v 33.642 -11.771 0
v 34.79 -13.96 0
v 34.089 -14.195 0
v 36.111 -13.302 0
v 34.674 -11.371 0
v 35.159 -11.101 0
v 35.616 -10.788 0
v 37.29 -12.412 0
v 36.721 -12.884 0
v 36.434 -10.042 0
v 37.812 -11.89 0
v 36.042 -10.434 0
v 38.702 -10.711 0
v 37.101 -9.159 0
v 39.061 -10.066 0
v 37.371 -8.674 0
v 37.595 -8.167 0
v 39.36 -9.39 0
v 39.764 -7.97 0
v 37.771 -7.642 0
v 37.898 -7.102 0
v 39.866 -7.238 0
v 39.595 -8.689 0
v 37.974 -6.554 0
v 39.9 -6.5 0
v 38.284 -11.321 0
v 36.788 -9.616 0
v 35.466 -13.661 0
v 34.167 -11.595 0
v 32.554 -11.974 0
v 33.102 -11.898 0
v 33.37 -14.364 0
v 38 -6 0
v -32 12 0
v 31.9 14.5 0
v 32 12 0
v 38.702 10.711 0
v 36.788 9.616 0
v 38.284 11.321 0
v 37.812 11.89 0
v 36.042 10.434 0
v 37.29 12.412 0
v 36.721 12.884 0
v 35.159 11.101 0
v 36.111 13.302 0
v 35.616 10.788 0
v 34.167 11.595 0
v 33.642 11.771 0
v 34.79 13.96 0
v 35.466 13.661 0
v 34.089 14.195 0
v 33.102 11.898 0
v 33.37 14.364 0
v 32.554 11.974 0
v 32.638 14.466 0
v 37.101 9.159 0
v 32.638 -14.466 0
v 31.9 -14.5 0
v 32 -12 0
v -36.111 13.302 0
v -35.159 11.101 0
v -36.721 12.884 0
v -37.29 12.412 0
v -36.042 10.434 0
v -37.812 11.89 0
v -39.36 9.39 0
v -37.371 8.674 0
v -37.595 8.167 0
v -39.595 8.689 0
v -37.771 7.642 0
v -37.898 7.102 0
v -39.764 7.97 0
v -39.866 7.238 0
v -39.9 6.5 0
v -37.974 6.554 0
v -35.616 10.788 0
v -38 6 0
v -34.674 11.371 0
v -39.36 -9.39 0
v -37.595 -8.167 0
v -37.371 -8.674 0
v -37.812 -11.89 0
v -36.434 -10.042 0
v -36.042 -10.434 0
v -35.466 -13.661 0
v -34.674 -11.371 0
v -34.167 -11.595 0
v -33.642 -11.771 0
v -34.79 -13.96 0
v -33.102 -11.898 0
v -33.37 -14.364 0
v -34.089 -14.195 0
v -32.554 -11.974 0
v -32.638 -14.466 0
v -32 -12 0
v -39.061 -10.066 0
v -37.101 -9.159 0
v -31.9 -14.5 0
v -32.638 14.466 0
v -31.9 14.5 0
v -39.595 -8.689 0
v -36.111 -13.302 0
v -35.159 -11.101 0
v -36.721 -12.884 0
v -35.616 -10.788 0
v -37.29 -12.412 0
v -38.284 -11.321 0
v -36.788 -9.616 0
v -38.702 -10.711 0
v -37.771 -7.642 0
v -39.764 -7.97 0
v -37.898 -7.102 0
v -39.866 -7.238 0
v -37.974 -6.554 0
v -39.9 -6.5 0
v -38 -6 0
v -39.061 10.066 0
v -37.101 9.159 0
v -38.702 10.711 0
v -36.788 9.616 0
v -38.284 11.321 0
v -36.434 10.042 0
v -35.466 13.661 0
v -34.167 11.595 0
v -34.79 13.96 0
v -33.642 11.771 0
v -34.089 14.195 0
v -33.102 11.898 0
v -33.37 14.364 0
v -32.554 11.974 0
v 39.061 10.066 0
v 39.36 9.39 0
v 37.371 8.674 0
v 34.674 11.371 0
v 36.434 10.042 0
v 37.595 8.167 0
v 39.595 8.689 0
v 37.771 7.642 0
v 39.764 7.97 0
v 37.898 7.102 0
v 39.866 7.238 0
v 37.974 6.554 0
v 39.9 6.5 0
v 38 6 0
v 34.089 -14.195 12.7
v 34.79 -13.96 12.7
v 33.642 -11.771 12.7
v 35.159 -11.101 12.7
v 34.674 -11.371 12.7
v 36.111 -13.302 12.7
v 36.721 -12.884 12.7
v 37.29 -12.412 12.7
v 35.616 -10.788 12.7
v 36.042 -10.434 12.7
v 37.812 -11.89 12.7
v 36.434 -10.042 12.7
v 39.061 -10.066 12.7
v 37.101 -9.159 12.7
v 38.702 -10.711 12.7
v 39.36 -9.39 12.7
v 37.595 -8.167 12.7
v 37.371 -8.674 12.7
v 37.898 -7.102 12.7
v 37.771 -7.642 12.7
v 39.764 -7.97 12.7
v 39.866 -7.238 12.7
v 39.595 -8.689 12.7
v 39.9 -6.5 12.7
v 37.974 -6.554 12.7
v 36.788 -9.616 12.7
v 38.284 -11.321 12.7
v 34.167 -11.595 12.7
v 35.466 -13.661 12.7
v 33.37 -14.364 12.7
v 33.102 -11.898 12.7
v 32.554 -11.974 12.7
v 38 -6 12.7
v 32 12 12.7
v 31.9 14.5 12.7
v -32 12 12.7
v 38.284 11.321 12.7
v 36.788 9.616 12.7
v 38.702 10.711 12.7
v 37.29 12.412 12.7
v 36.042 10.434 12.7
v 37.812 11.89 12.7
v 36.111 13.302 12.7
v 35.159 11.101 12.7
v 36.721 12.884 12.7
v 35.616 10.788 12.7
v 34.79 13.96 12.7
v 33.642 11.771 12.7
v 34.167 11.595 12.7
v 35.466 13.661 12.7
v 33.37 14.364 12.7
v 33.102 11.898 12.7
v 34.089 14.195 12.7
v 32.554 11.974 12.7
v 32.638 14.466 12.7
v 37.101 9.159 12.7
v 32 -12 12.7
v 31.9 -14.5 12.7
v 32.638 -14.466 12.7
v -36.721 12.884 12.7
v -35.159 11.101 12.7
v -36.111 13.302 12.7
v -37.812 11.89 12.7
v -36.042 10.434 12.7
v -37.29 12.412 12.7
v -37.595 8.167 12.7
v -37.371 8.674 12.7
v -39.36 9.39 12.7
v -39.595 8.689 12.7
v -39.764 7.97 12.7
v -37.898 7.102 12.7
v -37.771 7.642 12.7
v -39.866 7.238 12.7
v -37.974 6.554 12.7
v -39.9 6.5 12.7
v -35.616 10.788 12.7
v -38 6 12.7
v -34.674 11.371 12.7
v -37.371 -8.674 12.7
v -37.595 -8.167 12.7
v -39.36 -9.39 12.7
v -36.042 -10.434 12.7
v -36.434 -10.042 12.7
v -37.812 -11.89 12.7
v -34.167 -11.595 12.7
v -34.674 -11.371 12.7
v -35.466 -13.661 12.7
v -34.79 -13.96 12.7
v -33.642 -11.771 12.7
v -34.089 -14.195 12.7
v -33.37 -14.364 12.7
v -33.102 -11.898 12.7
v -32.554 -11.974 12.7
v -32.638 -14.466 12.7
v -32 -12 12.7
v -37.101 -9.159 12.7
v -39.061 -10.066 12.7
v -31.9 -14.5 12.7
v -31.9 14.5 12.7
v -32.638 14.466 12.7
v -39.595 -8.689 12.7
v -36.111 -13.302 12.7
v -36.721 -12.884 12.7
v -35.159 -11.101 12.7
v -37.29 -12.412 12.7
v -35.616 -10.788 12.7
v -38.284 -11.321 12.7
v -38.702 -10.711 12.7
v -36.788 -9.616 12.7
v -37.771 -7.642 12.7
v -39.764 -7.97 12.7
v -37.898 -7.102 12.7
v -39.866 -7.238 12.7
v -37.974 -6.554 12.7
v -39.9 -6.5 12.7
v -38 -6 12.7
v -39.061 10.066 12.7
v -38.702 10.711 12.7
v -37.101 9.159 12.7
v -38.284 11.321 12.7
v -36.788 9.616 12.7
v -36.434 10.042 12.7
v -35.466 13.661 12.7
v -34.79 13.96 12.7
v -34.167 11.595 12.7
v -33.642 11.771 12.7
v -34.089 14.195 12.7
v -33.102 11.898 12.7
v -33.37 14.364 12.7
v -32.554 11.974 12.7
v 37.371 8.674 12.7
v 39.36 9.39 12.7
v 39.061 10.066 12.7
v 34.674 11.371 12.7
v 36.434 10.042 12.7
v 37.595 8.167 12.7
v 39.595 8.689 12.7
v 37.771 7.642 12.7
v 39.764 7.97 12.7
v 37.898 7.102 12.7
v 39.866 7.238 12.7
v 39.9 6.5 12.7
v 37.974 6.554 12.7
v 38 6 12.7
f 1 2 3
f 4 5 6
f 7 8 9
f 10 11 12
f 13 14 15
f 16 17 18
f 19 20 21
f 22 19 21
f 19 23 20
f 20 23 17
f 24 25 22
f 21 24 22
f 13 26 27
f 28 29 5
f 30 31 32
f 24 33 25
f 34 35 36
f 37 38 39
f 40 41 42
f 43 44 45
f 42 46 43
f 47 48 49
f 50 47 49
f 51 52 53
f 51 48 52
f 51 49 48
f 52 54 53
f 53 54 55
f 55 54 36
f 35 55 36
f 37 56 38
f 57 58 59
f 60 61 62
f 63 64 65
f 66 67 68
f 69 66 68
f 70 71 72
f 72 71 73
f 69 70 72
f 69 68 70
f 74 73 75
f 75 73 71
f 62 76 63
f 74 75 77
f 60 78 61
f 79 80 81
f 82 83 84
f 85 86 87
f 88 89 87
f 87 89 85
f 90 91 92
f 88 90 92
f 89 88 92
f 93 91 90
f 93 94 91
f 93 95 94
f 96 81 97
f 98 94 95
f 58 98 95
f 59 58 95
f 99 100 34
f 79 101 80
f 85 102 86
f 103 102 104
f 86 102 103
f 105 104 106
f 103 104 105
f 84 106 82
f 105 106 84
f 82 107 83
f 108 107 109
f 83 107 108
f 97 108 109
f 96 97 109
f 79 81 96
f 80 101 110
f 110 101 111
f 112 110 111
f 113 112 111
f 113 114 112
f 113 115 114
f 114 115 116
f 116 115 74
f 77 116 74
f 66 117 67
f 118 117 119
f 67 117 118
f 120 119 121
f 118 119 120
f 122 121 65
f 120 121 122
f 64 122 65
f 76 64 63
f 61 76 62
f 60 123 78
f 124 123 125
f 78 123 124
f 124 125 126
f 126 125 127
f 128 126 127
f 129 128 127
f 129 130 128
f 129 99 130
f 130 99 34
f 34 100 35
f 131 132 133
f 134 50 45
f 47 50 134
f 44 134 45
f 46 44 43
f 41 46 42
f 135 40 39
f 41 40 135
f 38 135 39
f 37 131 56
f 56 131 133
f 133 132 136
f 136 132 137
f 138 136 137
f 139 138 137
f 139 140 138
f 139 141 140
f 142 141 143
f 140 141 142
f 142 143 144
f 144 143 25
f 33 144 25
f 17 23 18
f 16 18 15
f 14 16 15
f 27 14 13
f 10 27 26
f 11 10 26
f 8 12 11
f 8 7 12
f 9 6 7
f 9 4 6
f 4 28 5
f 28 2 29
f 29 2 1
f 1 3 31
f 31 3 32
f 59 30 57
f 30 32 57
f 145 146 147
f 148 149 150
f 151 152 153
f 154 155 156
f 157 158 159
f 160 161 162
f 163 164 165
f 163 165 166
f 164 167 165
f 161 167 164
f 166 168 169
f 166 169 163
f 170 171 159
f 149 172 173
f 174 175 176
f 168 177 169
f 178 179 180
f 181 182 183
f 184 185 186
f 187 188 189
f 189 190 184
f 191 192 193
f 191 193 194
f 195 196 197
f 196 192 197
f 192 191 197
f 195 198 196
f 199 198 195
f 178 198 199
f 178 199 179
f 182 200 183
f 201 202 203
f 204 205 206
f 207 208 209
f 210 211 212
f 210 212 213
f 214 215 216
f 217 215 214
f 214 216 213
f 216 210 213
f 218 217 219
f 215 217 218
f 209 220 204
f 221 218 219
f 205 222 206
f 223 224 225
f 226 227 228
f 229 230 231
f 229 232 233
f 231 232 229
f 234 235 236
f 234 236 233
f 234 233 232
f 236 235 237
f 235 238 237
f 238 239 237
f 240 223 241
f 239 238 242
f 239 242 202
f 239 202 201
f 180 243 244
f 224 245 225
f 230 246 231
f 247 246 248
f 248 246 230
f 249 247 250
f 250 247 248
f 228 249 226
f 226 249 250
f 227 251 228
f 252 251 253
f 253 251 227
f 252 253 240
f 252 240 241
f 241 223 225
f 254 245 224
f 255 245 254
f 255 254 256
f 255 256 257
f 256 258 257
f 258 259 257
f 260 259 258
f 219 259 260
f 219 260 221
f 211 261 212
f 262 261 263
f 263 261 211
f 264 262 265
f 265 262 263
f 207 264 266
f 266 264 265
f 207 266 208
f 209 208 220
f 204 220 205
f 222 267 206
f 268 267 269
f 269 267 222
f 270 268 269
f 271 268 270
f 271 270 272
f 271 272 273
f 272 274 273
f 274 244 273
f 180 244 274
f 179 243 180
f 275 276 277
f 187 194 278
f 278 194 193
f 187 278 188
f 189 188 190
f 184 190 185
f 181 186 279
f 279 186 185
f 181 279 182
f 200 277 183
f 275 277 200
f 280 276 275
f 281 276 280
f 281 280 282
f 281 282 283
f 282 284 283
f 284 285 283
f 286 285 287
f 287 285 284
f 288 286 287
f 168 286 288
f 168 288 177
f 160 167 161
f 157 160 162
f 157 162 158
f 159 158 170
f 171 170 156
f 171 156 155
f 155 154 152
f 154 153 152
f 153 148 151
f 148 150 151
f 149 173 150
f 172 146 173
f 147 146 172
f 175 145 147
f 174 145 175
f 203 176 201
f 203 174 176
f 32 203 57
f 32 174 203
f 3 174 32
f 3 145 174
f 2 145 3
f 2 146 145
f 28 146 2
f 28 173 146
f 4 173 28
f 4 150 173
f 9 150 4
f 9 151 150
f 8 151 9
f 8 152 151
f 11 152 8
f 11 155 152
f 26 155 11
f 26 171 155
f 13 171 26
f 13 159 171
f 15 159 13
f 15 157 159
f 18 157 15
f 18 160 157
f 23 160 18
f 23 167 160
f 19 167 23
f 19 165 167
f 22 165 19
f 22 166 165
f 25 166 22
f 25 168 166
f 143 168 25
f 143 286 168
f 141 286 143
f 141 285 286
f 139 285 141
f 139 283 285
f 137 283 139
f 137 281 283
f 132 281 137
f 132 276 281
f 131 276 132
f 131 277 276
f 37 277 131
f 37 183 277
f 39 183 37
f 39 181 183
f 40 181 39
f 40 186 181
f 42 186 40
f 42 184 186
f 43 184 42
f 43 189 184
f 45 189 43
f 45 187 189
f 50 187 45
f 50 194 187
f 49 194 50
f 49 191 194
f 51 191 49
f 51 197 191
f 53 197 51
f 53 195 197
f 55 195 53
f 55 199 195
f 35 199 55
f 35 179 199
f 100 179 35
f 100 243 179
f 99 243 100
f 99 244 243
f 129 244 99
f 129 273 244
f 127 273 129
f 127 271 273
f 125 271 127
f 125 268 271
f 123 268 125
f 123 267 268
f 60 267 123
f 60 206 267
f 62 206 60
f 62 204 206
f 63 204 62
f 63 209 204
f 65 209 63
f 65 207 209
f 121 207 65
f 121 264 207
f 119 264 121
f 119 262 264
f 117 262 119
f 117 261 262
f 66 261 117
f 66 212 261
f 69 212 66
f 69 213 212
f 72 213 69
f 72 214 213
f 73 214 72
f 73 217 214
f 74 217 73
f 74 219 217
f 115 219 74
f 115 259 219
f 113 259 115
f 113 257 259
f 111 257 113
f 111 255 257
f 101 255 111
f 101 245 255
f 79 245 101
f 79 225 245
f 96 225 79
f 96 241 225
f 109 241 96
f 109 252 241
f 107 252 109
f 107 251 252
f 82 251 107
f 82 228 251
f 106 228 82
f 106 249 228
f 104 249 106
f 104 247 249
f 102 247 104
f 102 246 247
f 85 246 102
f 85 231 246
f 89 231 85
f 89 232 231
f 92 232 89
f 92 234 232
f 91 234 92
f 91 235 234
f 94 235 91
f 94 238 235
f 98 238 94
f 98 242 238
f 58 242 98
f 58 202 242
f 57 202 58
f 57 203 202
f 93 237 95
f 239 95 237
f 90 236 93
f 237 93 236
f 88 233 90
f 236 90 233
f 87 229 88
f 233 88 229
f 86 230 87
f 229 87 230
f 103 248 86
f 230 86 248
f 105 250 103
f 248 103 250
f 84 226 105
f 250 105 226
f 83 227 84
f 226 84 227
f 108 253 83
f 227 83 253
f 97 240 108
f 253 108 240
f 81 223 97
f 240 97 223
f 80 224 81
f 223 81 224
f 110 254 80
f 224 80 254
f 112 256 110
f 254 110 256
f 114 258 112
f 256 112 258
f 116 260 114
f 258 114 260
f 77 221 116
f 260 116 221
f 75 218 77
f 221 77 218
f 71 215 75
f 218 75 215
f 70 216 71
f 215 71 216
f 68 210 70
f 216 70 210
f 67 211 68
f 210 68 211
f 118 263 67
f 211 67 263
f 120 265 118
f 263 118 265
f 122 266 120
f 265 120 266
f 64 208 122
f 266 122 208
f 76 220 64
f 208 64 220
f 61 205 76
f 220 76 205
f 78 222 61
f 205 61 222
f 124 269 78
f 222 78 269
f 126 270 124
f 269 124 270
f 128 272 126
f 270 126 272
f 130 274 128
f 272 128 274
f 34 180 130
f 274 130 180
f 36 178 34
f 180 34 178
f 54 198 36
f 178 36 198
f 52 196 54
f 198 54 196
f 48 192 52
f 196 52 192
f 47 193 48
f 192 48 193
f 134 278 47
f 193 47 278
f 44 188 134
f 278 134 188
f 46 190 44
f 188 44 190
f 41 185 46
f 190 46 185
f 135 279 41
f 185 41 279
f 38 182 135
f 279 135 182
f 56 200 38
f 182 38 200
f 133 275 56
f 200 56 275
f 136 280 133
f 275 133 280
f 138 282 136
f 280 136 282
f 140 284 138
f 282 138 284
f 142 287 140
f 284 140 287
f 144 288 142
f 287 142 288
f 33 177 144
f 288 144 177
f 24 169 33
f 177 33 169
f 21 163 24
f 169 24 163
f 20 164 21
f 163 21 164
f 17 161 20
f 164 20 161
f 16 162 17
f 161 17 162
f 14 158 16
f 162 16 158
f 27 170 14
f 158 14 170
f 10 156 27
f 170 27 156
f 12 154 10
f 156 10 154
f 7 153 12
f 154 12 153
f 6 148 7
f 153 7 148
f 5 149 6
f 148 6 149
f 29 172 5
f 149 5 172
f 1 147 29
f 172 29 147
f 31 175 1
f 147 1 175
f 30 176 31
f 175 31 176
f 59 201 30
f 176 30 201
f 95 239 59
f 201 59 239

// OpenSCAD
// file: ../lib/TOGArrayLib1.scad
// TOGArrayLib1.5
// 
// Functions for working with arrays.
// 
// v1.1:
// - tal1_reduce assert(is_list(items)) to prevent infinite recursion
//   when given undefined or other non-list values
// v1.1.1:
// - Fix tal1_uniq_remap_v2 to return "list-remap-result" as the
//   first element of the returned list
// v1.2:
// - Add tal1_replace_at function
// v1.3:
// - tal1_is_vec_of, tal1_is_vec_of_num
// v1.4:
// - tal1_assert_for_each, for when you want to assert something
//   about each of a list of items and get nice failure messages
// v1.5:
// - Add tal1_duplicate_reversed function, which may be
//   handy when generating symmetrical polygons and stuff.

/**
 * Make a list with the contents of list `a`,
 * but starting at offset `off`, replaced by the contents of list `b`.
 * len(result) = max(len(a), off+len(b))
 */
function tal1_replace_at(a, off, b, default_value=undef, default_value_function=undef) =
	assert(is_list(a))
	assert(is_list(b))
	let( _dvf = !is_undef(default_value_function) ? default_value_function : function(i) default_value )
[
	for( i=[0:1:min(off,len(a))-1] ) a[i],
	for( i=[len(a):1:off-1] ) _dvf(i),
	for( i=[off:1:off+len(b)-1] ) b[i-off],
	for( i=[off+len(b):1:len(a)-1] ) a[i],
];

// Simplest case
assert([] == tal1_replace_at([], 0, []));
// Second simplest cases
assert(["foo"] == tal1_replace_at(["foo"], 0, []));
assert(["foo"] == tal1_replace_at([], 0, ["foo"]));
// Replace one item
assert(["foo","quux","baz"] == tal1_replace_at(["foo","bar","baz"], 1, ["quux"]));
// Replace and extend
assert(["foo","quux","tuna","tina"] == tal1_replace_at(["foo","bar","baz"], 1, ["quux", "tuna", "tina"]));
// Add beyond end of `a`
assert(["foo","zzz","quux"] == tal1_replace_at(["foo"], 2, ["quux"], default_value="zzz"));
// Adding 'nothing' should still fill to that point with defaults
assert(["foo","zzz","zzz"] == tal1_replace_at(["foo"], 3, [], default_value="zzz"));


function tal1_reduce(start, items, func, offset=0) =
	assert(is_list(items))
	len(items) == offset ? start :
	tal1_reduce(func(start, items[offset]), items, func, offset+1);

function tal1_consecutive_duplicate_count(items) = tal1_reduce(
	[0, undef],
	items,
	function(z,item) [z[0] + (item == z[1] ? 1 : 0), item]
)[0];

assert(0 == tal1_consecutive_duplicate_count([]));
assert(0 == tal1_consecutive_duplicate_count([50]));
assert(1 == tal1_consecutive_duplicate_count([50,50]));
assert(0 == tal1_consecutive_duplicate_count([50,51,52,53]));
assert(1 == tal1_consecutive_duplicate_count([50,51,52,52]));
assert(3 == tal1_consecutive_duplicate_count([50,50,50,50]));

// Set test_size to arbirarily large values
// to ensure that OpenSCAD can handle heavy recursion
let(test_size=1000) assert(test_size/2 == tal1_consecutive_duplicate_count([for(i=[0:1:test_size-1]) floor(i/2)]));



function tal1_uniq_(items, off0, off1) =
	let(chunklen = off1-off0)
	chunklen == 0 ? [] :
	chunklen == 1 ? [items[off0]] :
	let(half=floor(chunklen/2))
	let(left  = tal1_uniq_(items, off0     , off0+half))
	let(right = tal1_uniq_(items, off0+half, off1     ))
	assert(len(left) > 0)
	assert(len(right) > 0)
	left[len(left)-1] == right[0] ? [each left, for(i=[1:1:len(right)-1]) right[i]] :
	[each left, each right];

/** Given a list of items, returns a new list with identical consecutive items merged */
function tal1_uniq(items) = tal1_uniq_(items, 0, len(items));

assert([] == tal1_uniq([]));
assert([123] == tal1_uniq([123]));
assert([55,0,1,2,3] == tal1_uniq([55,0,1,2,3]));
assert([55,0,1,2] == tal1_uniq([55,0,1,1,2]));
assert([55,0,1] == tal1_uniq([55,55,0,0,0,0,0,0,1,1,1,1]));
assert([55,0] == tal1_uniq([55,0,0,0,0,0,0,0]));



/**
 * Returns [new items, old index -> new index mapping].
 * No-op version.
 */
function tal1_uniq_remap_v1(items) =
	["list-remap-result", items, [for (vi=[0:1:len(items)-1]) vi]];

// [a, a, b, b, c, c]
//
// [a,    ...], []  -> [a],[0]
// [a, a, ...], [0] -> [a],[0,0]

assert([1,2,3] == [1,2,3]);

/**
 * Recursive version that will combine adjacent identical vertexes,
 * but will use the original items.
 */
function tal1_uniq_remap_v2(items, map=[]) =
	let(index = len(map))
	len(items) == index ? ["list-remap-result", items, map] :
	index == 0 ? tal1_uniq_remap_v2(items, [0]) :
	items[index] == items[map[index-1]] ? tal1_uniq_remap_v2(items, [for(vi=map) vi, map[index-1]]) :
	tal1_uniq_remap_v2(items, [for(vi=map) vi, index]);

assert(tal1_uniq_remap_v2([1,1,2,2,3,4]) == ["list-remap-result", [1,1,2,2,3,4], [0,0,2,2,4,5]]);


/**
 * Returns true if `vec` is a list of at least min_len items
 * and component_check(each item, even those beyond min_len) is true.
 */
function tal1_is_vec_of(vec, min_len=0, component_check=function(x) true) =
	assert(is_num(min_len) && min_len >= 0)
	assert(is_function(component_check))
	is_list(vec) && len(vec) >= min_len &&
	tal1_reduce(true, vec, function(prev,item) prev && component_check(item));

function tal1_is_vec_of_num(vec, min_len=0) = tal1_is_vec_of(vec, min_len, function(i) is_num(i));

assert( true == tal1_is_vec_of_num([1,2,3]));
assert( true == tal1_is_vec_of_num([]));
assert( true == tal1_is_vec_of_num([1,2,3], 3));
assert(false == tal1_is_vec_of_num([1,2], 3));
assert(false == tal1_is_vec_of_num([1,2,"spoon"], 3));
// Requirements are ambiguous when
// first min_len items are numbers, but there are non-numeric items afterwards,
// so let's error on the side of saying 'no, it's not a list of numbers';
// i.e. the item check and the min_len are independent.
assert(false == tal1_is_vec_of_num([1,2,3,"artichoke"], 3));


/**
 * Asserts that item_checker(each item in list, index of item)[0] is true.
 * Second element of item_checker return value is assertion message.
 * Returns the original list, in case that's useful to you.
 */
function tal1_assert_for_each(list, item_checker) =
	let( _ignored = [ for(i=[0:1:len(list)-1])
		let(q=item_checker(list[i],i))
		let(passed=is_bool(q) ? q : is_list(q) ? q[0] : assert(false, str(
			"tal1_assert_for_each: item_checker should return Bool|[Bool,String], but returned ",
			q, " for item at index ", i)))
		let(message=is_list(q) ? q[1] : undef)
		assert(passed, message)
		q
	])
	list;

// Callback can return a boolean...
assert([1,2,3] == tal1_assert_for_each([1,2,3], function(v,i) is_num(v)));
// ...or a [boolean, string]
assert([1,2,3] == tal1_assert_for_each([1,2,3], function(v,i) [is_num(v), "element be a num"]));

// [a, b, c] -> [a, b, c, rxf(c), rxf(b), rxf(a)]
function tal1_duplicate_reversed(list, rxf=function(item) item) =
	[
		each list,
		for( i=[len(list)-1 : -1 : 0] ) rxf(list[i]),
	];
// file: ../lib/TOGComplexLib1.scad
function tcplx1_multiply(a, b) =
	[a[0]*b[0] - a[1]*b[1], a[0]*b[1] + a[1]*b[0]];
function tcplx1_divide(a, b) =
	let(bot = (b[0]*b[0] + b[1]*b[1]))
	[
		(a[0]*b[0] + a[1]*b[1])/bot,
		(a[1]*b[0] - a[0]*b[1])/bot
	];

assert([-11,23] == tcplx1_multiply([3,2], [1,7]));

assert([-1,3] == tcplx1_multiply([3,1], [0,1]));
assert([-1,3] == tcplx1_multiply([0,1], [3,1]));

echo(tcplx1_divide([-1,3], [3,1]));
assert([0,1] == tcplx1_divide([-1,3], [3,1]));

function tcplx1_normalize(vec) =
	let(veclen = sqrt(vec[0]*vec[0]+vec[1]*vec[1]))
	[vec[0] / veclen, vec[1] / veclen];

function tcplx1_relative_turnvec_vv(v0, v1) =
	tcplx1_divide(tcplx1_normalize(v1), tcplx1_normalize(v0));

function tcplx1_relative_turnvec_abc(p0, p1, p2) = tcplx1_relative_turnvec_vv(p1-p0, p2-p1);

// A 90-degree turn
assert([0,1] == tcplx1_relative_turnvec_abc([0,0], [1,0], [1,1]));
assert([0,1] == tcplx1_relative_turnvec_abc([0,0], [0,1], [-1,1]));

// A 45-degree turn
assert(tcplx1_normalize([1,1]) == tcplx1_relative_turnvec_abc([0,0], [1,0], [ 2,1]));
assert(tcplx1_normalize([1,1]) == tcplx1_relative_turnvec_abc([0,0], [0,1], [-1,2]));


function tcplx1_relative_angle_abc(p0, p1, p2) =
	let(turnvec = tcplx1_relative_turnvec_abc(p0, p1, p2))
	atan2(turnvec[1], turnvec[0]);

assert(-135 == tcplx1_relative_angle_abc([0,0], [1,0], [0,-1]));
assert( -90 == tcplx1_relative_angle_abc([0,0], [1,0], [1,-1]));
assert(   0 == tcplx1_relative_angle_abc([0,0], [1,0], [2, 0]));
assert(  90 == tcplx1_relative_angle_abc([0,0], [1,0], [1, 1]));
assert( 135 == tcplx1_relative_angle_abc([0,0], [1,0], [0, 1]));

assert(  90 == tcplx1_relative_angle_abc([1,1], [3,3], [1, 5]));
// file: ../lib/TOGMod1Constructors.scad
// TOGMod1Constructors-v1.11
// 
// Functions to construct objects understood by TOGMod1
// 
// v1.1:
// - Add togmod1_make_rounded_rect
// v1.2:
// - togmod1_make_rounded_rect can make ovals
// v1.3:
// - togmod1_circle_points, to just get the points of a circle
// - if pos parameter to circle function has a third element,
//   returned vertexes will include it as the z component;
// v1.3.1
// - Some assertions
// v1.4:
// - Refactor togmod1_rounded_rect_points and togmod1_circle_points
//   to use togmod1__make_nd_vector_adder for adapting to whatever
//   `pos` parameter is.
// v1.5:
// - togmod_rounded_rect_points will not simplify completely rounded sides
//   (where length of side is exactly twice the rounding radius)
//   unless simplify_rounded_sides=true
//   - This makes it more useful for polyhedron generation,
//     where radius varies, but number of points must remain constant.
// v1.6:
// - togmod1_make_rect makes a simple rectangle
// - togmod1_make_rounded_rect will defer to togmod1_make_rect when r=0
// v1.7:
// - togmod1_make_circle will return empty shape (["union"]) when d=0
// v1.8:
// - Add togmod1_text
// v1.9:
// - togmod1_circle_points uses 3 as minimum circle point count instead of 6
// v1.10:
// - Fix togmod1_linear_extrude_y so that range corresponds to Y start/end and
//   polygon X,Y correspond to X,Z.  Previously it was rotated wrongly,
//   which would have gone unnoticed for symmetrical shapes centered at 0,0.
// v1.11:
// - Remove an 'echo'

use <./TOGArrayLib1.scad>

function togmod1__make_nd_vector_adder(origin=[0,0]) =
	let(origin_is_zero = tal1_reduce(true, origin, function(prev,item) prev && item == 0))
	origin_is_zero ? (function(vec) len(vec) >= len(origin) ? vec : tal1_replace_at(origin, 0, vec)) :
	function(vec) [
		for(i=[0:1:max(len(origin),len(vec))-1]) (len(vec) > i ? vec[i] : 0) + (len(origin) > i ? origin[i] : 0),
	];

assert([1,2,3] == togmod1__make_nd_vector_adder()([1,2,3]));
assert([1,2,3] == togmod1__make_nd_vector_adder([0,0,3])([1,2]));


function togmod1_make_cuboid(size) =
	assert(is_list(size))
	assert(len(size) >= 3)
	assert(is_num(size[0]))
	assert(is_num(size[1]))
	assert(is_num(size[2]))
	["polyhedron-vf", [
		[-size[0]/2, -size[1]/2, -size[2]/2],
		[+size[0]/2, -size[1]/2, -size[2]/2],
		[-size[0]/2, +size[1]/2, -size[2]/2],
		[+size[0]/2, +size[1]/2, -size[2]/2],
		[-size[0]/2, -size[1]/2, +size[2]/2],
		[+size[0]/2, -size[1]/2, +size[2]/2],
		[-size[0]/2, +size[1]/2, +size[2]/2],
		[+size[0]/2, +size[1]/2, +size[2]/2]
	], [
		[0,1,3,2],[0,4,5,1],[4,6,7,5],[3,7,6,2],[1,5,7,3],[6,4,0,2]
	]];

function togmod1_make_polygon(verts) =
	["polygon-vp", verts, [[for( i=[0:1:len(verts)-1] ) i%len(verts)]]];

function togmod1_rounded_rect_points(size, r, pos=[0,0], simplify_rounded_sides=false) =
	assert(is_list(size))
	assert(len(size) >= 2)
	let(radii = is_list(r) ? r : is_num(r) ? [r,r] : assert(false, "rounded_rect r(adius) should be list<num> or num"))
	let(rx = radii[0])
	let(ry = radii[1])
	assert(is_num(rx))
	assert(is_num(ry))
	assert(size[0] >= 2*rx, str("size[0] must be >= 2*r[0]; size[0] = ",size[0],", 2*r[0] = ",2*rx))
	assert(size[1] >= 2*ry, str("size[1] must be >= 2*r[1]; size[1] = ",size[1],", 2*r[1] = ",2*ry))
	let(quarterfn=max($fn/4, 1))
	let(qfnx = simplify_rounded_sides && size[0] == 2*rx ? quarterfn-1 : quarterfn)
	let(qfny = simplify_rounded_sides && size[1] == 2*ry ? quarterfn-1 : quarterfn)
	let(finalizepos = togmod1__make_nd_vector_adder(pos))
[
	for(a=[0 : 1 : qfnx]) let(ang=      a*90/quarterfn) finalizepos([ size[0]/2-rx + rx*cos(ang),  size[1]/2-ry + ry*sin(ang)]),
	for(a=[0 : 1 : qfny]) let(ang= 90 + a*90/quarterfn) finalizepos([-size[0]/2+rx + rx*cos(ang),  size[1]/2-ry + ry*sin(ang)]),
	for(a=[0 : 1 : qfnx]) let(ang=180 + a*90/quarterfn) finalizepos([-size[0]/2+rx + rx*cos(ang), -size[1]/2+ry + ry*sin(ang)]),
	for(a=[0 : 1 : qfny]) let(ang=270 + a*90/quarterfn) finalizepos([ size[0]/2-rx + rx*cos(ang), -size[1]/2+ry + ry*sin(ang)]),
];

function togmod1_make_rect(size) =
	togmod1_make_polygon([
		[-size[0]/2, -size[1]/2],
		[+size[0]/2, -size[1]/2],
		[+size[0]/2, +size[1]/2],
		[-size[0]/2, +size[1]/2],
	]);

function togmod1_make_rounded_rect(size, r) =
	r == 0 ? togmod1_make_rect(size) :
	togmod1_make_polygon(togmod1_rounded_rect_points(size,r,simplify_rounded_sides=true));

/**
 * Returns points for an approximation of a circle where points are at distance r from pos.
 * Can be used to make other regular polygons, but the faces will be less than that
 * distance from pos (do some trig if you want face distance, e.g. for a hex nut).
 */
function togmod1_circle_points(r, pos=[0,0], d=undef) =
	assert( !is_undef(r) || !is_undef(d) )
	assert(!is_undef(pos[0]))
	assert(!is_undef(pos[1]))
	let(finalizepos = togmod1__make_nd_vector_adder(pos))
	let(r_ = !is_undef(r) ? r : d/2)
	let(fn = max($fn, 3))
	[for(i=[0 : 1 : fn-1]) finalizepos([r_*cos(i*360/fn), r_*sin(i*360/fn)])];

function togmod1_make_circle(r, pos=[0,0], d=undef) =
	r == 0 || d == 0 ? ["union"] :
	togmod1_make_polygon(togmod1_circle_points(r=r, pos=pos, d=d));

function togmod1_make_cylinder(d, zrange=[0,1], r=undef, pos=[0,0]) =
	assert( !is_undef(r) || !is_undef(d) )
	let( r_ = !is_undef(r) ? r : d/2 )
	// TODO: Make polyhedron directly
	["linear-extrude-zs", zrange, togmod1_make_circle(r=r_, pos=pos)];

function togmod1__is_range1d(range) = is_list(range) && len(range) == 2 && is_num(range[0]) && is_num(range[1]);

function togmod1_linear_extrude_z(range, shape) =
	assert(togmod1__is_range1d(range))
	["linear-extrude-zs", range, shape];
function togmod1_linear_extrude_x(range, shape) =
	assert(togmod1__is_range1d(range))
	["rotate", [90, 0, 90], togmod1_linear_extrude_z(range, shape)];
function togmod1_linear_extrude_y(range, shape) =
	assert(togmod1__is_range1d(range))
	["rotate", [90, 0,  0], togmod1_linear_extrude_z([-range[1], -range[0]], shape)];

function togmod1_text(text, size, font, halign, valign, spacing, direction, language, script) =
	["text-tsfhvsdls", text, size, font, halign, valign, spacing, direction, language, script];
// file: ../lib/TOGMod1.scad
// TOGMod1.9
// OpenSCAD library for representing shapes
// 
// See also: Functional OpenSCAD (https://github.com/thehans/FunctionalOpenSCAD)
// 
// v1.8:
// - Add `text-tsfhvsdls`
// v1.9
// - Add `offset-ds` (offset with _d_elta a _s_hape)

module togmod1_domodule(mod) {
	assert(is_list(mod));
	assert(len(mod) > 0);
	if( mod[0] == "polygon-vp" ) {
		// ["polygon-vp", vertexes, paths]
		polygon(points=mod[1], paths=mod[2]);
	} else if( mod[0] == "polyhedron-vf" ) {
		polyhedron(mod[1], faces=mod[2]);
	} else if( mod[0] == "scale" ) {
		assert(len(mod) == 3);
		scale(mod[1]) togmod1_domodule(mod[2]);
	} else if( mod[0] == "translate" ) {
		assert(len(mod) == 3);
		assert(is_list(mod[1]));
		for(c=mod[1]) assert(is_num(c), "translate component should be numeric");
		translate(mod[1]) togmod1_domodule(mod[2]);
	} else if( mod[0] == "rotate" ) {
		assert(len(mod) == 3);
		rotate(mod[1]) togmod1_domodule(mod[2]);
	} else if( mod[0] == "intersection" ) {
		intersection_for( i=[1:1:len(mod)-1] ) togmod1_domodule(mod[i]);
	} else if( mod[0] == "difference" ) {
		difference() {
			togmod1_domodule(mod[1]);
			for( i=[2:1:len(mod)-1] ) togmod1_domodule(mod[i]);
		}
	} else if( mod[0] == "union" ) {
		for( i=[1:1:len(mod)-1] ) togmod1_domodule(mod[i]);
	} else if( mod[0] == "hull" ) {
		hull() for( i=[1:1:len(mod)-1] ) togmod1_domodule(mod[i]);
	} else if( mod[0] == "offset-rs" ) {
		assert(len(mod) == 3);
		assert(is_num(mod[1]));
		assert(is_list(mod[2]));
		offset(mod[1]) togmod1_domodule(mod[2]);
	} else if( mod[0] == "linear-extrude-zs" ) {
		// ["linear-extrude-zs", [z0,z1], 2d_shape] // centered
		// ["linear-extrude-zs", height, 2d_shape]
		let( zrange = is_list(mod[1]) ? mod[1] : [-mod[1]/2, mod[1]/2] ) {
			translate([0,0,zrange[0]]) linear_extrude(zrange[1]-zrange[0]) togmod1_domodule(mod[2]);
		}
	} else if( mod[0] == "render" ) {
		render() togmod1_domodule(mod[1]);
	} else if( mod[0] == "minkowski" ) {
		minkowski() {
			togmod1_domodule(mod[1]);
			togmod1_domodule(mod[2]);
		}
	} else if( mod[0] == "x-debug" ) {
		# togmod1_domodule(mod[1]);
	} else if( mod[0] == "x-color" ) {
		color(mod[1]) togmod1_domodule(mod[2]);
	} else if( mod[0] == "text-tsfhvsdls" ) {
		text(text=mod[1], size=mod[2], font=mod[3], halign=mod[4], valign=mod[5], spacing=mod[6], direction=mod[7], language=mod[7], script=mod[8]);
	} else if( mod[0] == "offset-ds" ) {
		assert(is_num(mod[1]));
		assert(is_list(mod[2]));
		offset(delta=mod[1]) togmod1_domodule(mod[2]);
	} else {
		assert(false, str("Unrecognized shape: ", mod[0]));
	}
}
// main file
// MMP-2315-insert-v1.0
// 
// Insert for MMP-2315 as created by MonitorMountRouterJig-v1.6
// 
// Customize for the size of hole you want so you don't have
// to print a whole new panel for each one!
// 
// For denomstration, some 2MB Memorex card is...
//   9.6mm thick, 19.2mm wide, 71.1mm long
// 
// MMP-2315's 1"x3" hole has, I think, 6mm radius rounded corners.
// 
// This is entirely to work with the thing I already printed,
// WSITEM-200835.  I think that in the future, I might want to
// print the outer thing with inserts in mind, and maybe
// have an overhanging lip or 14-degree walls or something so
// that the insert can be held securely in place.

// Difference in radius between bushing and bit
template_counterbore_r_offset = 2;

inch = 25.4;

use <../lib/TOGPath1.scad>
use <../lib/TOGMod1.scad>
use <../lib/TOGMod1Constructors.scad>

outer_size = [3*inch + template_counterbore_r_offset*2, 1*inch + template_counterbore_r_offset*2];
outer_round = 8; // 6 might do, but to be safe, make it a little bigger
outer_offset = -0.2;

inner_size = [72, 20];
inner_round = 6;
// Inner offset is outwards; negative makes a larger hole
inner_offset = -template_counterbore_r_offset;

thickness = 1/2*inch;

$fn = $preview ? 12 : 72;

function make_rect_rath(size, ops=[]) = ["togpath1-rath",
	["togpath1-rathnode", [-size[0]/2, -size[1]/2], each ops],
	["togpath1-rathnode", [ size[0]/2, -size[1]/2], each ops],
	["togpath1-rathnode", [ size[0]/2,  size[1]/2], each ops],
	["togpath1-rathnode", [-size[0]/2,  size[1]/2], each ops],
];

function mane() =
	let(effective_outer_size = [outer_size[0]+outer_offset*2, outer_size[1]+outer_offset*2])
	let(effective_inner_size = [inner_size[0]-inner_offset*2, inner_size[1]-inner_offset*2])
	echo(effective_outer_size=effective_outer_size, effective_inner_size=effective_inner_size)
	let(effective_size_diff = effective_outer_size - effective_inner_size)
	let(inner_xlation = [0,0] /* effective_size_diff/2 */)
	echo(effective_size_diff=effective_size_diff, inner_xlation=inner_xlation)
	let(outer_rath = make_rect_rath(effective_outer_size, [["round", outer_round]]))
	let(inner_rath = make_rect_rath(effective_inner_size, [["round", inner_round]]))
	let(poly = ["difference",
		togmod1_make_polygon(togpath1_rath_to_points(outer_rath)),
		["translate", inner_xlation, togmod1_make_polygon(togpath1_rath_to_points(inner_rath))]
	])
	togmod1_linear_extrude_z([0, thickness], poly);

togmod1_domodule(mane());
